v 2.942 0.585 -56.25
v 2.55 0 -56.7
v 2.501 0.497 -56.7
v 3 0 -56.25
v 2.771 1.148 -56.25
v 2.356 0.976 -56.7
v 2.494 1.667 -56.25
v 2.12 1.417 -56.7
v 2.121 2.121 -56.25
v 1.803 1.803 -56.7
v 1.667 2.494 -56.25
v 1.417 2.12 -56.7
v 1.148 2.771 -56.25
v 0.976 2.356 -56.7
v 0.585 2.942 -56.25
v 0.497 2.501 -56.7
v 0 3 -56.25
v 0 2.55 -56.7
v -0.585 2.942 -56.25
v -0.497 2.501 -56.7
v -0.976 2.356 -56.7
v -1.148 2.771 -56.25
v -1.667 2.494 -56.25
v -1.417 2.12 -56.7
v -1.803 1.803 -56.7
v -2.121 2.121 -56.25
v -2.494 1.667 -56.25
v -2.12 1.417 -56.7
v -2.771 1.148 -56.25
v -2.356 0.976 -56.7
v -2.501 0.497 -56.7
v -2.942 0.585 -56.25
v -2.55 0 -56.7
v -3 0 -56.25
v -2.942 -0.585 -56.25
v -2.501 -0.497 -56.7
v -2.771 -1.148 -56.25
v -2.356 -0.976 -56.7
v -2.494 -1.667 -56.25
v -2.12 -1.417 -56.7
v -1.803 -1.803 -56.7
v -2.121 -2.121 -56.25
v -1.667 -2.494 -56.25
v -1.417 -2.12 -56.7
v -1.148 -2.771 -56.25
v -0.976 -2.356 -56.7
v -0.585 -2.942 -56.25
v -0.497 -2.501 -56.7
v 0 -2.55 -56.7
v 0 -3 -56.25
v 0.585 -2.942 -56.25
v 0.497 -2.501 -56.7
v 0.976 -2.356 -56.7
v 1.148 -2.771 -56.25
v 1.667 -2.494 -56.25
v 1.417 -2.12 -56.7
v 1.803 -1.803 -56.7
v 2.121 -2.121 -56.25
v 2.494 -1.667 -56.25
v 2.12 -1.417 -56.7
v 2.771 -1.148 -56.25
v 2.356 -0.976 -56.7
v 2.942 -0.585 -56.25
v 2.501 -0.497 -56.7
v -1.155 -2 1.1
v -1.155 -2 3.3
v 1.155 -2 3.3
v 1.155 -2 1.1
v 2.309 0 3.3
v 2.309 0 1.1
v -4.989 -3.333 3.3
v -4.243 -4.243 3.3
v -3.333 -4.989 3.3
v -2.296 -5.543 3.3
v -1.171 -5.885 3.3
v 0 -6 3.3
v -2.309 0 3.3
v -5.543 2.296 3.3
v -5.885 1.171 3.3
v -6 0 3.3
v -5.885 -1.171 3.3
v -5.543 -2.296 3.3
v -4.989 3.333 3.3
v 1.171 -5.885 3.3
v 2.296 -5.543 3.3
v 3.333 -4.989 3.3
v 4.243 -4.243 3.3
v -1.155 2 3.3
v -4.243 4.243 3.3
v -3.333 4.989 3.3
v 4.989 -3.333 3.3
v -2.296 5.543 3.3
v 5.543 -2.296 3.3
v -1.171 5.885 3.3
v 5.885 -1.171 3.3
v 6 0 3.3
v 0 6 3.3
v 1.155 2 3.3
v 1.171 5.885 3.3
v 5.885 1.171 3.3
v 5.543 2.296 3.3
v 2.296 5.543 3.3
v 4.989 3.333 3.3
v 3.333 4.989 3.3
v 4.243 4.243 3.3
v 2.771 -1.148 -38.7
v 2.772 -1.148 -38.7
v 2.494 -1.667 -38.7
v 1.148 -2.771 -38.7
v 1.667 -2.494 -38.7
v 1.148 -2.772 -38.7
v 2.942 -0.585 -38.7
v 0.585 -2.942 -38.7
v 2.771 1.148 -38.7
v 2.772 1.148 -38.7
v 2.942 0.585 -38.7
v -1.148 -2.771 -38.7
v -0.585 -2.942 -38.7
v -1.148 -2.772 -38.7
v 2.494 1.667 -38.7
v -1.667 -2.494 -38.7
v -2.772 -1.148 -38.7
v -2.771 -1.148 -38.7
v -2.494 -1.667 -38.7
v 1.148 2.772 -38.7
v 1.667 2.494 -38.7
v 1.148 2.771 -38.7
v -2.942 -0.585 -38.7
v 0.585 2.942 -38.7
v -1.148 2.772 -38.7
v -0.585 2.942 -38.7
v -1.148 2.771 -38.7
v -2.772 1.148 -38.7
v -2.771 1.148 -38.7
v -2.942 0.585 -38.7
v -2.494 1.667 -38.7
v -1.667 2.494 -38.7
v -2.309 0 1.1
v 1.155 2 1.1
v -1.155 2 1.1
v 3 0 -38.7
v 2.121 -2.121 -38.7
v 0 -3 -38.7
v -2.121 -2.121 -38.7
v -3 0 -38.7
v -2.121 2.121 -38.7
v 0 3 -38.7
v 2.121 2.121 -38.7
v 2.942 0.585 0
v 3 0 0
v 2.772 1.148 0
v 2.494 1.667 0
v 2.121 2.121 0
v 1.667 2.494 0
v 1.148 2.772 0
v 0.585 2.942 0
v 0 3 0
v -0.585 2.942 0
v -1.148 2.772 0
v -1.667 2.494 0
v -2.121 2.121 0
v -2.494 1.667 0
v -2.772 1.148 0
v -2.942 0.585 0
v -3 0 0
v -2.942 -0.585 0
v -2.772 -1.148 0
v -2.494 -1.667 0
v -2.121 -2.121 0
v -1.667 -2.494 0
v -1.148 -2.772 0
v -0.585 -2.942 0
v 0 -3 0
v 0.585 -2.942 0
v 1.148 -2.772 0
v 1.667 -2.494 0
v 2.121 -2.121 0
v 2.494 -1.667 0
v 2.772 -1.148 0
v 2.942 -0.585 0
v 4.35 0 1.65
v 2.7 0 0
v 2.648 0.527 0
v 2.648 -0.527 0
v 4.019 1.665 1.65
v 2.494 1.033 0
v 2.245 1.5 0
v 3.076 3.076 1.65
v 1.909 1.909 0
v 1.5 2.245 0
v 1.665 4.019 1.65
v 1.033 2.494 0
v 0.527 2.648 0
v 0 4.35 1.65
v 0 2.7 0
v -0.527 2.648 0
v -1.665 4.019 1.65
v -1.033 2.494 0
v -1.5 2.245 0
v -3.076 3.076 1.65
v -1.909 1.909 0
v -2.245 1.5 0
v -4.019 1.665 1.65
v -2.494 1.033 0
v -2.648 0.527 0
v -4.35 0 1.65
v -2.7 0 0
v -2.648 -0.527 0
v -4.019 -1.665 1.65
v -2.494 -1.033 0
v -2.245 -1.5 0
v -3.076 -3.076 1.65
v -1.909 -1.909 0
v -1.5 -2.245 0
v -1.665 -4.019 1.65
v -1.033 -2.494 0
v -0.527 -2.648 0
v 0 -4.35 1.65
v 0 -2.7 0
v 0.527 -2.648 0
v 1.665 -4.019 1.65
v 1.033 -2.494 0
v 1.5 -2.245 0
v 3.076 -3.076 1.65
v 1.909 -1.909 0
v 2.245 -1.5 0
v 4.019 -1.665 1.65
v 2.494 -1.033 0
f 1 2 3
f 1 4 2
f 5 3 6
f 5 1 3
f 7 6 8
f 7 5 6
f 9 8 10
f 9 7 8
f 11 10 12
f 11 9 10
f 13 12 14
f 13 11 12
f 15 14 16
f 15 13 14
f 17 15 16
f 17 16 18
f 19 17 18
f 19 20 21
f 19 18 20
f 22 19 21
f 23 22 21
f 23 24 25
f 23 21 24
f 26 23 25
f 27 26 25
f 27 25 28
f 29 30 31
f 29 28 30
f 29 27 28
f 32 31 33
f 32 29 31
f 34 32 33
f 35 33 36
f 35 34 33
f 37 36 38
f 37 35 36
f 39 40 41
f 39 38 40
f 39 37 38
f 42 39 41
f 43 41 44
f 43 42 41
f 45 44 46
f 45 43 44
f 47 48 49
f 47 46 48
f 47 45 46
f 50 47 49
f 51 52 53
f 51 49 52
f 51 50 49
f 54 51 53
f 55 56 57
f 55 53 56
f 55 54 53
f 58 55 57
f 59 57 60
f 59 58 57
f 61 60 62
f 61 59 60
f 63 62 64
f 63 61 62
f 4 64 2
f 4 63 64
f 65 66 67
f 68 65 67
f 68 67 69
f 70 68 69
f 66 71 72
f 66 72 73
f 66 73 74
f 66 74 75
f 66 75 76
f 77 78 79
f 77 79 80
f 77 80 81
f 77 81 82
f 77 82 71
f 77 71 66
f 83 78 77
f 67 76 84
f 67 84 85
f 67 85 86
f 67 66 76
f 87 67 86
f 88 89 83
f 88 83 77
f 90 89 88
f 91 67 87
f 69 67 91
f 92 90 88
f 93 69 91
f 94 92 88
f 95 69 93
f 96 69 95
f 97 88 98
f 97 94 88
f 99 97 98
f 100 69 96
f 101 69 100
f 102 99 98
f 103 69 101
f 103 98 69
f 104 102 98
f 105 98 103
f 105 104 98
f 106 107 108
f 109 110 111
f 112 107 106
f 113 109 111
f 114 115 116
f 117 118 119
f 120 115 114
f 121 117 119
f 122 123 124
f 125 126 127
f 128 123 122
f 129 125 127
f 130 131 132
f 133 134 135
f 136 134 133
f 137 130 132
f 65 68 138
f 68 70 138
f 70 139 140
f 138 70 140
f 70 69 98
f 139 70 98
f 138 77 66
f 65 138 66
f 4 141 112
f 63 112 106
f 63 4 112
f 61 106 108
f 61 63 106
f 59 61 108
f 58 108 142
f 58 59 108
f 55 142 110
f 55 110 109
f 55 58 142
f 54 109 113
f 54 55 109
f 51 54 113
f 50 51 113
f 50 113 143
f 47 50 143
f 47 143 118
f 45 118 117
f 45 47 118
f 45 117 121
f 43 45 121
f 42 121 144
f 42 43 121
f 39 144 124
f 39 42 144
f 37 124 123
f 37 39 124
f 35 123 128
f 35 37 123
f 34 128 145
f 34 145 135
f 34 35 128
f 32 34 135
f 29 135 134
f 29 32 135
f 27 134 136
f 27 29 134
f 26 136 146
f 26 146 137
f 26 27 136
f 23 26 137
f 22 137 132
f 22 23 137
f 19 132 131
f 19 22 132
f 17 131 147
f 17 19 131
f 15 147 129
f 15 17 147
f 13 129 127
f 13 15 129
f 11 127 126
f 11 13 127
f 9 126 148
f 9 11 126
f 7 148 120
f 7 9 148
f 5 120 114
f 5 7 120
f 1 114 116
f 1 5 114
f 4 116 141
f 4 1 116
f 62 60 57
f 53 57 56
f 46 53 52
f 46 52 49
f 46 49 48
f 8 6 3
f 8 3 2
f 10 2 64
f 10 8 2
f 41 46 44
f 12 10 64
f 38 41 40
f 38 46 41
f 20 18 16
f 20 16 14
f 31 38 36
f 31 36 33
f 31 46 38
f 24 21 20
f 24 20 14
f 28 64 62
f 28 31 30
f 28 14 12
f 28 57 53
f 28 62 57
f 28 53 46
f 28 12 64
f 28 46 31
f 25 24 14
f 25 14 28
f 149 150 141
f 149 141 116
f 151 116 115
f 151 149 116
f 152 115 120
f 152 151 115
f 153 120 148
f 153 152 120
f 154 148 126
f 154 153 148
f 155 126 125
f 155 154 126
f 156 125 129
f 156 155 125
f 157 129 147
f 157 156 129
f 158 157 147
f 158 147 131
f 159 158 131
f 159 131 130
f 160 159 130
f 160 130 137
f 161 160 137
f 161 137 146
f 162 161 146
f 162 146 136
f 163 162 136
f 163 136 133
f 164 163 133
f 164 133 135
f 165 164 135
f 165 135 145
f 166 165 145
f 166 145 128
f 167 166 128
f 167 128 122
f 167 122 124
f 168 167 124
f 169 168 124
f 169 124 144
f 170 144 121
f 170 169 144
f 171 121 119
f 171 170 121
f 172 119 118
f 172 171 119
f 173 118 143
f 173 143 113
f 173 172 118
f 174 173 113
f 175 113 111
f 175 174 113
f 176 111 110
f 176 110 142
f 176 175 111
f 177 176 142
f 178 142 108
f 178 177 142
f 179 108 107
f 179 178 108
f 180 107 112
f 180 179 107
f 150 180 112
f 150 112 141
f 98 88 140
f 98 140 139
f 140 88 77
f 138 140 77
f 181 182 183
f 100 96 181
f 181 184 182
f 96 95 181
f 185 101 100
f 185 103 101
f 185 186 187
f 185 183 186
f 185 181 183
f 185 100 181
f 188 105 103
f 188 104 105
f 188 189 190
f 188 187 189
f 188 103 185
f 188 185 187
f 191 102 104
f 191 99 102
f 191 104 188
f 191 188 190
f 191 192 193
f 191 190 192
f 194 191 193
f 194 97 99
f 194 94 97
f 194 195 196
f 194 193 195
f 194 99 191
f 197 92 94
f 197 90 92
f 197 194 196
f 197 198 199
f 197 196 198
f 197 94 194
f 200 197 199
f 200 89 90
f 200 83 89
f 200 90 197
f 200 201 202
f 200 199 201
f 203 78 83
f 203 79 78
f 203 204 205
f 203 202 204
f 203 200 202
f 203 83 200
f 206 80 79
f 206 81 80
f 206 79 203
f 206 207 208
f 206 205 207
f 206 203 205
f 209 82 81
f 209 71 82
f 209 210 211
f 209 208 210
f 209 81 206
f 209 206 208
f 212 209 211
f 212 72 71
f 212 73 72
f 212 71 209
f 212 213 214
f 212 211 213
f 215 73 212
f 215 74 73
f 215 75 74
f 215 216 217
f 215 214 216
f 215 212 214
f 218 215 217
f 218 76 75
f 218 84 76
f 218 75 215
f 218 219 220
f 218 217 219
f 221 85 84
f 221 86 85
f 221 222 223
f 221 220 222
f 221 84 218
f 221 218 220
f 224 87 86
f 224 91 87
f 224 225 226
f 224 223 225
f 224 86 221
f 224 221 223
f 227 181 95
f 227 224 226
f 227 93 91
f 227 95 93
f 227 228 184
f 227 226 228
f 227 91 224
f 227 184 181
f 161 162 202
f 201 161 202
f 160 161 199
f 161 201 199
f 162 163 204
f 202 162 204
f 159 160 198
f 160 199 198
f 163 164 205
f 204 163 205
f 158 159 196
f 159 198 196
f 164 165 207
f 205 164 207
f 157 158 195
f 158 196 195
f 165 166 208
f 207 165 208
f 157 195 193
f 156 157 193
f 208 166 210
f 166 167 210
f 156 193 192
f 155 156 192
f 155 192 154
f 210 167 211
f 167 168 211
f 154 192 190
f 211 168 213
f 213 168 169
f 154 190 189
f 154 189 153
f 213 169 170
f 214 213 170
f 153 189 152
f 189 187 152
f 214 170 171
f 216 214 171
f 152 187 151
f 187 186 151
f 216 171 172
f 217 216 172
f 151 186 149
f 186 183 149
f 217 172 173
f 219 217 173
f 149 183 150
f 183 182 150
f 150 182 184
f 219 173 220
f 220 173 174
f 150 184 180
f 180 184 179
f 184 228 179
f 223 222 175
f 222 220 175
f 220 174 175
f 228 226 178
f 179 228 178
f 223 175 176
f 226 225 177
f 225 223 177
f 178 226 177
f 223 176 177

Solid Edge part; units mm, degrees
sketch "Sketch1" plane through (0, 0, 0) normal (0, 0, 1) x (1, 0, 0)
  circle A0 centre (0, 0) radius 6
  dimension "D1" = 12
extrude "Protrusion1" add sketch "Sketch1" along normal blind 3.3
sketch "Sketch2" plane through (0, 0, 0) normal (0, 0, -1) x (1, 0, 0)
  circle A0 centre (0, 0) radius 3
extrude "Protrusion2" add sketch "Sketch2" along normal blind 56.7
sketch "Sketch3" plane through (0, 0, -56.7) normal (0, 0, -1) x (1, 0, 0)
  circle A0 centre (0, 0) radius 2.9997
extrude "Cutout1" cut sketch "Sketch3" against normal blind 18 flip side to cut
chamfer "Chamfer_1" distance 0.45 angle 45 1 edges at (-2.9997, 0, -56.7)
sketch "Sketch4" plane through (0, 0, 3.3) normal (0, 0, 1) x (1, 0, 0)
  line L0 (-1.1547, 2) -> (1.1547, 2)
  line L1 (2.3094, 0) -> (1.1547, 2)
  line L2 (1.1547, -2) -> (2.3094, 0)
  line L3 (-1.1547, -2) -> (1.1547, -2)
  line L4 (-2.3094, 0) -> (-1.1547, -2)
  line L5 (-1.1547, 2) -> (-2.3094, 0)
  dimension "D1" = 4
extrude "Cutout2" cut sketch "Sketch4" against normal blind 2.2
sketch "Sketch5" plane through (0, 0, 0) normal (0, -1, 0) x (1, 0, 0)
  line L0 (6, 3.3) -> (2.7, 0)
  line L1 (2.7, 0) -> (6, 0)
  line L2 (6, 0) -> (6, 3.3)
revolve "RevolvedCutout1" cut sketch "Sketch5" angle 360 about axis through (0, 0, 14.0017) along (0, 0, -1)
properties part number "209564" material "Stainless Steel, 304"
